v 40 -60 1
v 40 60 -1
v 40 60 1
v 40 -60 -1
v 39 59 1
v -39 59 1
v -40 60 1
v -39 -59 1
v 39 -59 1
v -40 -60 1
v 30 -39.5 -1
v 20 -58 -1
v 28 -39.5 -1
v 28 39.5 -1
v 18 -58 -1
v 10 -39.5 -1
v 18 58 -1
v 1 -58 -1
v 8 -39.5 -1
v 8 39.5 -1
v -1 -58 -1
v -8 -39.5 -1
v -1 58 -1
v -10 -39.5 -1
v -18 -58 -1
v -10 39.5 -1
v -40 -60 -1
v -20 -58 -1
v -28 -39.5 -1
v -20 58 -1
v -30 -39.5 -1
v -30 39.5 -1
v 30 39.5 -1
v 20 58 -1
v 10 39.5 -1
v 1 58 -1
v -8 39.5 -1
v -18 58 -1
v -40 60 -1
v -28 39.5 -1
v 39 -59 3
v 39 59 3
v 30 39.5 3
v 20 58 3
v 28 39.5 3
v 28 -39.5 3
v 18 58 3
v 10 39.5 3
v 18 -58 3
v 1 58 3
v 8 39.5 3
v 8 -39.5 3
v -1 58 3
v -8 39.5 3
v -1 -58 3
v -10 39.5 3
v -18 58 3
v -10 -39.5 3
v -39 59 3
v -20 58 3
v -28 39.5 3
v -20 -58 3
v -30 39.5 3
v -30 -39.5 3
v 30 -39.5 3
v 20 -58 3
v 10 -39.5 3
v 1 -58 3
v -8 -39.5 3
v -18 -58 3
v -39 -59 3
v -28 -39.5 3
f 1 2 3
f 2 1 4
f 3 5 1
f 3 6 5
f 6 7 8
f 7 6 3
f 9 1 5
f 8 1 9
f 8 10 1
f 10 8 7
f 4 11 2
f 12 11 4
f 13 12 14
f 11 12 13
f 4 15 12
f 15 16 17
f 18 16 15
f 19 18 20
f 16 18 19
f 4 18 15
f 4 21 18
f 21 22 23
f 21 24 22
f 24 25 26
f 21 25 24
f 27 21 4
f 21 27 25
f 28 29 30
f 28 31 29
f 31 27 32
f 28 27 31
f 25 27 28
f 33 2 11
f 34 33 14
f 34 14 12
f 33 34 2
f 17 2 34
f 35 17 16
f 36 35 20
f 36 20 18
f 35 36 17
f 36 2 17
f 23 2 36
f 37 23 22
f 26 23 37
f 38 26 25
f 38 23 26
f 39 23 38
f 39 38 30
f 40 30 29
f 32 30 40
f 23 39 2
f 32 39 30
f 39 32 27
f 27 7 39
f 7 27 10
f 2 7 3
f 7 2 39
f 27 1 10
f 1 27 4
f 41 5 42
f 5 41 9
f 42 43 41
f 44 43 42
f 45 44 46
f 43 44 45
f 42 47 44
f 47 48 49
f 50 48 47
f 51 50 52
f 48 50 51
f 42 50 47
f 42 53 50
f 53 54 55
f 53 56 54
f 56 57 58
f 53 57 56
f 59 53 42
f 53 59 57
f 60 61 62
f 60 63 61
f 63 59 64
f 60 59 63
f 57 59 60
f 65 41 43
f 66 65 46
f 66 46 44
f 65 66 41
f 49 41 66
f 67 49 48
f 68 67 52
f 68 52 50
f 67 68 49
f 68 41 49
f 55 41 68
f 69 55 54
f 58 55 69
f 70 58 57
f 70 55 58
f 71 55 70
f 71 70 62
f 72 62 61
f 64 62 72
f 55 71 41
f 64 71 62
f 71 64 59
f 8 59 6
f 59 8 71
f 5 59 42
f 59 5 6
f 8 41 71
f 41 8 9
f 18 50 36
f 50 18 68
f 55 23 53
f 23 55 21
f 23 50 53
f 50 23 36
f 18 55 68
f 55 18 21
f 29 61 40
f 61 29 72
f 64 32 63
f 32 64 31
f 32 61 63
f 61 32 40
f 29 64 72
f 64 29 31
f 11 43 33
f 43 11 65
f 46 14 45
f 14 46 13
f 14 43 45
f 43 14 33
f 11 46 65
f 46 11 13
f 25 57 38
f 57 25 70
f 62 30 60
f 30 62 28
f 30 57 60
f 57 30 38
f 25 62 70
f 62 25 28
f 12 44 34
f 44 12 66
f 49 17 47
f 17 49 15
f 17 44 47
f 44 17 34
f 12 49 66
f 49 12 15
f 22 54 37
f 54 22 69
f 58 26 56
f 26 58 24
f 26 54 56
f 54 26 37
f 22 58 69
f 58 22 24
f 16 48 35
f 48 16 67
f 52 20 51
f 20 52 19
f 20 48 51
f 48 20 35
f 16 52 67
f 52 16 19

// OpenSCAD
// file: constants.scad
width = 80;
depth = 120;
height = 60;

thickness = 2;

legWidth = thickness / 2;
legDepth = 10;
legHeight = 10;
// main file
include <constants.scad>;

module lid() {
    difference() {
        union() {
            cube([width, depth, thickness], center = true);
            translate([0, 0, thickness]) {
                difference() {
                    cube([width - thickness, depth - thickness, thickness], center = true);
                }
            }
        }

        cube([thickness, depth - (thickness * 2), height], center = true);

        translate([-((width / 4) + (width / 8)  - thickness / 2), 0, 0 ]) {
            cube([thickness, (depth * 2/3) - (thickness / 2) , height], center = true);
        }

        translate([(width / 4) + (width / 8) - thickness / 2, 0, 0 ]) {
            cube([thickness, (depth * 2/3) - (thickness / 2) , height], center = true);
        }

        translate([-((width / 4) - thickness / 2), 0, 0 ]) {
            cube([thickness, depth - (thickness * 2) , height], center = true);
        }

        translate([(width / 4) - thickness / 2, 0, 0 ]) {
            cube([thickness, depth - (thickness * 2) , height], center = true);
        }

        translate([-((width / 8) - thickness / 2), 0, 0 ]) {
            cube([thickness, (depth * 2/3) - (thickness / 2) , height], center = true);
        }

        translate([(width / 8) - thickness / 2, 0, 0 ]) {
            cube([thickness, (depth * 2/3) - (thickness / 2) , height], center = true);
        }
    }
}

lid();
